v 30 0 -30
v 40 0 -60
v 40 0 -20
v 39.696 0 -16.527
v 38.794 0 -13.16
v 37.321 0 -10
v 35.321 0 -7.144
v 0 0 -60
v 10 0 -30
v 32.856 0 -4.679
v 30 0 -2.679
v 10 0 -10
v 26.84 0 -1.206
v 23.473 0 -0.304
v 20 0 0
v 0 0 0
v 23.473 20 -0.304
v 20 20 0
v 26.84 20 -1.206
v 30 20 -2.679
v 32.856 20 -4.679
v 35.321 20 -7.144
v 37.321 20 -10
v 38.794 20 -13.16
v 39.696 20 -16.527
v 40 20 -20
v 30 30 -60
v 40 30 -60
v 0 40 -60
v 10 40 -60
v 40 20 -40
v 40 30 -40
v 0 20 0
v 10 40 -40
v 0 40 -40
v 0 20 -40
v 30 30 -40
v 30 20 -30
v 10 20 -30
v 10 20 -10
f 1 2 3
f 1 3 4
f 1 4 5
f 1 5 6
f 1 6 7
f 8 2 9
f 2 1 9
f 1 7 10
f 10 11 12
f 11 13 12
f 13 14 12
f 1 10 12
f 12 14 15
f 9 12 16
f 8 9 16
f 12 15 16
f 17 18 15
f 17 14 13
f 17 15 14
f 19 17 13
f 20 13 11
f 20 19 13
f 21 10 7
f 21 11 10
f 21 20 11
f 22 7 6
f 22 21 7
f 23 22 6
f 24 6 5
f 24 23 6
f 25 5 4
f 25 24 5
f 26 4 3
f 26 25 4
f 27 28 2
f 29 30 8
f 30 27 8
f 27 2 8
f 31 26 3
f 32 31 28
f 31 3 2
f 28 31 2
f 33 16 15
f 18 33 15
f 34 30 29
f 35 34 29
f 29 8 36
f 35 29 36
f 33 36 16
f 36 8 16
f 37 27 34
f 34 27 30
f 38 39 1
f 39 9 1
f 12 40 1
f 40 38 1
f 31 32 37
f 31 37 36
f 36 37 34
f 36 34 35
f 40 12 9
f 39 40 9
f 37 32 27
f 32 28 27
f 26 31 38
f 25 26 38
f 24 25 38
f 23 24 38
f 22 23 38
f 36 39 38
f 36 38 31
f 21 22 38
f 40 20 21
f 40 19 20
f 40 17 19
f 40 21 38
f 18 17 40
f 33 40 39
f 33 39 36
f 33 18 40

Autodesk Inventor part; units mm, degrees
ref_plane "YZ Plane" through (0, 0, 0) normal (1, 0, 0) x (0, 1, 0)
ref_plane "XZ Plane" through (0, 0, 0) normal (0, 1, 0) x (-1, 0, 0)
ref_plane "XY Plane" through (0, 0, 0) normal (0, 0, 1) x (1, 0, 0)
sketch "草圖1" plane through (0, 0, 0) normal (0, 1, 0) x (-1, 0, 0)
  line L0 (0, 0) -> (-40, 0)
  line L1 (-40, 0) -> (-40, -60)
  line L2 (-40, -60) -> (0, -60)
  line L3 (0, -60) -> (0, 0)
  line L4 (-10, -30) -> (-30, -30)
  line L5 (-30, -30) -> (-30, -10)
  line L6 (-30, -10) -> (-10, -10)
  line L7 (-10, -10) -> (-10, -30)
  dimension "d0" = 10
  dimension "d1" = 10
  dimension "d2" = 20
  dimension "d3" = 60
  dimension "d4" = 20
  dimension "d5" = 10
extrude "擠出1" add sketch "草圖1" along normal blind 20
sketch "草圖2" plane through (40, 0, -60) normal (0, 0, -1) x (-1, 0, 0)
  line L0 (0, 20) -> (40, 20) projected
  line L1 (40, 20) -> (0, 20) projected
  line L2 (0, 20) -> (0, 30)
  line L3 (0, 30) -> (10, 30)
  line L4 (10, 30) -> (30, 40)
  line L5 (30, 40) -> (40, 40)
  line L6 (40, 40) -> (40, 20)
  point P0 (40, 0)
  dimension "d8" = 10
  dimension "d9" = 10
  dimension "d10" = 20
  dimension "d11" = 20
extrude "擠出2" add sketch "草圖2" against normal blind 20
chamfer "倒角1" distance 20 angle 45 1 edges at (30, 10, -10)
fillet "圓角1" radius 20 1 edges at (40, 10, 0)
properties part number "37"
